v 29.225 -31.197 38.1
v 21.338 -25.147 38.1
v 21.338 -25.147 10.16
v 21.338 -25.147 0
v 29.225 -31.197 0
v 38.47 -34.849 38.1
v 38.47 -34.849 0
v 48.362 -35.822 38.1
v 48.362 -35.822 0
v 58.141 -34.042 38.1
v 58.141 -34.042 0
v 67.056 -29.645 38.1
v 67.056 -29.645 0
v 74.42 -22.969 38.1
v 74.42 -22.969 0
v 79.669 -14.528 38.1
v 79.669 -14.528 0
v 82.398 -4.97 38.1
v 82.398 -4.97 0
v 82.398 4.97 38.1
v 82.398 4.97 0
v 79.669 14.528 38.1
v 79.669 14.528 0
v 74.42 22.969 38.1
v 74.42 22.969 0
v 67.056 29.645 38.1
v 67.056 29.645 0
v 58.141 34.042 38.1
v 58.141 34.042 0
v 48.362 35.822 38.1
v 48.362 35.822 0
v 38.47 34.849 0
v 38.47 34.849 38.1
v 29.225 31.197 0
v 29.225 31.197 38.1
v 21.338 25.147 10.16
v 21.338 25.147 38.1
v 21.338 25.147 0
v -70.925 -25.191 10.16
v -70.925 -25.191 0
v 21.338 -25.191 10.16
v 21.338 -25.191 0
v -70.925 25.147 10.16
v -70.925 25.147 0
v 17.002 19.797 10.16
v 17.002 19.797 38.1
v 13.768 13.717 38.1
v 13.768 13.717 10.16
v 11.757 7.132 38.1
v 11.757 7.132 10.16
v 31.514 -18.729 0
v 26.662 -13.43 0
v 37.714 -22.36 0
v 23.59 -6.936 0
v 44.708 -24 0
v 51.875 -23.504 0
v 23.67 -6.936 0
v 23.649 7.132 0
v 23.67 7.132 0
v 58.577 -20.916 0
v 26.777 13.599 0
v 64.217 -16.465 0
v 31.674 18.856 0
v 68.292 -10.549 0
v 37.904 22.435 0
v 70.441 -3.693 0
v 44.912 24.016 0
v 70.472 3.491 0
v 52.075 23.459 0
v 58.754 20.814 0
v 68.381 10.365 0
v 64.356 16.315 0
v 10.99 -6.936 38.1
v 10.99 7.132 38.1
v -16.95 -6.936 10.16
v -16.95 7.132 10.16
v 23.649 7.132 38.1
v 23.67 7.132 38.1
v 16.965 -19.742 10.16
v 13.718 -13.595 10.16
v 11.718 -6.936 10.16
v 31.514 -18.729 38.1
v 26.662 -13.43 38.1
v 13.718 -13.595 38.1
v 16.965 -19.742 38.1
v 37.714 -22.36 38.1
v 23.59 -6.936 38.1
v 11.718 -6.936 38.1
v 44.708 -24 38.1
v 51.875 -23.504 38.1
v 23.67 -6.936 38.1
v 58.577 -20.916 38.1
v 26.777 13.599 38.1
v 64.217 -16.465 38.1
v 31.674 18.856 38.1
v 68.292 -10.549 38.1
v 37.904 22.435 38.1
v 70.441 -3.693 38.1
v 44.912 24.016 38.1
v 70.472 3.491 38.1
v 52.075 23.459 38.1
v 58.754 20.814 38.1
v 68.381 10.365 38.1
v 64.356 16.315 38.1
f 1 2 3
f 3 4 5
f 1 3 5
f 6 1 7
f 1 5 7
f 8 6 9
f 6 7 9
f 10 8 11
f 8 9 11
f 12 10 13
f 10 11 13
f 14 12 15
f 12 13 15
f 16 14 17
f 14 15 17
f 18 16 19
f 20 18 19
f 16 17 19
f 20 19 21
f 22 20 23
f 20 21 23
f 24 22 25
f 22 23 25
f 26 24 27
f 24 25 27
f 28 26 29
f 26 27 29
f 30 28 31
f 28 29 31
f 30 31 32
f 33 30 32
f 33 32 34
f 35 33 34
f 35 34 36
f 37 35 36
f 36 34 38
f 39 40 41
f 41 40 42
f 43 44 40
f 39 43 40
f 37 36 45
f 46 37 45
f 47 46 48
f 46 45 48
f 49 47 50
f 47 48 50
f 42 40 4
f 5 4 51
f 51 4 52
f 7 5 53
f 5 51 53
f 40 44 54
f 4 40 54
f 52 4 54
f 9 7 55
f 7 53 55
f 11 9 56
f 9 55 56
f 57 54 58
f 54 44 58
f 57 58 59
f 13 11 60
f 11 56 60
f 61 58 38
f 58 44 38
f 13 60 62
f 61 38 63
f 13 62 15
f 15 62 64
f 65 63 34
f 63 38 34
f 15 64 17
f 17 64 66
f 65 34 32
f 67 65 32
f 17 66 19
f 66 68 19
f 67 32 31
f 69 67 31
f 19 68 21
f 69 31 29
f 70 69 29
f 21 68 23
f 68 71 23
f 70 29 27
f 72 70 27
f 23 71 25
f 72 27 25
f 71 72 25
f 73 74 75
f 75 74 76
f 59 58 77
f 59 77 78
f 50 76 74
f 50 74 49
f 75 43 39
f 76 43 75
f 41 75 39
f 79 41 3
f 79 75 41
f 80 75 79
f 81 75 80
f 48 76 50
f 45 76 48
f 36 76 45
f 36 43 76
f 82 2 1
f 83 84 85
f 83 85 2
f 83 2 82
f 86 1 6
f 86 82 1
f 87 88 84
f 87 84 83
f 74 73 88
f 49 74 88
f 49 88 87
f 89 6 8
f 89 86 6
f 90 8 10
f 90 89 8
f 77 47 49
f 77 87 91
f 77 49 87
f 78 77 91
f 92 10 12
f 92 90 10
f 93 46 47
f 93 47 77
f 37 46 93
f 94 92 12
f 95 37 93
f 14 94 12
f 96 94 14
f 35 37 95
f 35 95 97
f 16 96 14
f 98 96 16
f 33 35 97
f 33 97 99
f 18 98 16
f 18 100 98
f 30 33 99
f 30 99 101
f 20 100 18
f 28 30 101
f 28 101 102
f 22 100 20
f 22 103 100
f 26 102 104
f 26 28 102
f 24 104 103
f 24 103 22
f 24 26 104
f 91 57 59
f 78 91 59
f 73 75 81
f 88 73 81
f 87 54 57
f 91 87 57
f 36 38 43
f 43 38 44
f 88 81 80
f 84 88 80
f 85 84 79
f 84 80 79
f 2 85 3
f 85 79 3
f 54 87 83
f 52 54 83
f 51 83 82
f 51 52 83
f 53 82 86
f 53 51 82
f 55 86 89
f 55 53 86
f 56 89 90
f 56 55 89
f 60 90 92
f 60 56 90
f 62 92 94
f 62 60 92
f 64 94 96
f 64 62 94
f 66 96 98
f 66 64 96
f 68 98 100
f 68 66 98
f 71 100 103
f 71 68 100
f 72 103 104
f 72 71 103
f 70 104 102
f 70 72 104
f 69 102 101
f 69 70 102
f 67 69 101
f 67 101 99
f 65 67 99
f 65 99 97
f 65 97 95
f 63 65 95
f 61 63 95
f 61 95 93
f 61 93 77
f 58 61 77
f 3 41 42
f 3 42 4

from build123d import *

# Parameters (mm, degrees)
F1_R        = 24.0785224066
F2_DEPTH    = 38.1
F3_DEPTH    = 10.16
F4_W        = 72.8784613311
F4_H        = 14.0676931478
F5_DEPTH    = 38.1
F6_DEPTH    = 0.508
F7_T4_DEPTH = 321.0752082512


# Not quite as in the source:
# - a fillet or chamfer that OpenCascade refuses, or shapes differently, is made with other operations: its cross-section is extruded or revolved along the edge and cut away or added


with BuildPart() as f2:
    # F1 (on face) → F2 (new body)
    with BuildSketch(Plane.XY):
        with BuildLine():
            ThreePointArc((21.3381504126, 25.1467317917), (11.0402076987, 0), (21.3381504126, -25.1467317917))
            ThreePointArc((21.3381504126, -25.1467317917), (60.4791188031, -33.1778787511), (82.7444076987, 0))
            ThreePointArc((82.7444076987, 0), (60.4791188031, 33.1778787511), (21.3381504126, 25.1467317917))
        make_face()
        with Locations((46.6475896537, 0)):
            Circle(F1_R, mode=Mode.SUBTRACT)
    extrude(amount=F2_DEPTH)

    # F0 (on Top) → F3 (join)
    with BuildSketch(Plane.XY):
        with BuildLine():
            ThreePointArc((21.3381504126, -25.1467317917), (11.0402076987, 0), (21.3381504126, 25.1467317917))
            Line((21.3381504126, 25.1467317917), (-70.9246173501, 25.1467317917))
            Line((-70.9246173501, 25.1467317917), (-70.9246173501, -25.1914039254))
            Line((-70.9246173501, -25.1914039254), (21.3381504126, -25.1914039254))
            Line((21.3381504126, -25.1914039254), (21.3381504126, -25.1467317917))
        make_face()
    extrude(amount=F3_DEPTH)

    # F4 (on Top) → F5 (join)
    with BuildSketch(Plane.XY):
        with Locations((-12.2608747333, 0.0976922456)):
            Rectangle(F4_W, F4_H)
    extrude(amount=F5_DEPTH)

    # F6 (cut): a face of the model
    f6_faces = [f2.faces().sort_by_distance(p)[0] for p in [
        (24.1783559322, 0.0976922456, 19.05),
    ]]
    extrude(f6_faces, amount=-F6_DEPTH, mode=Mode.SUBTRACT)

    # F7: chamfer of 59.69 on 1 edges, made by hand


with BuildPart() as f7_tool2:
    # F7_s3 → F7_t4 (new body)
    with BuildSketch(Plane.XZ.offset(-160.6352963712)):
        Polygon((10.9898946011, 38.1), (-48.7001053989, -21.59), (-48.7001053989, 38.1), align=None)
    extrude(amount=F7_T4_DEPTH)

    split(bisect_by=Plane.XY.offset(10.16), keep=Keep.TOP)


with BuildPart() as f2_1:
    add(f2.part)

    # F7_t1: cut F7_tool2
    add(f7_tool2.part, mode=Mode.SUBTRACT)


solid = f2_1.part
